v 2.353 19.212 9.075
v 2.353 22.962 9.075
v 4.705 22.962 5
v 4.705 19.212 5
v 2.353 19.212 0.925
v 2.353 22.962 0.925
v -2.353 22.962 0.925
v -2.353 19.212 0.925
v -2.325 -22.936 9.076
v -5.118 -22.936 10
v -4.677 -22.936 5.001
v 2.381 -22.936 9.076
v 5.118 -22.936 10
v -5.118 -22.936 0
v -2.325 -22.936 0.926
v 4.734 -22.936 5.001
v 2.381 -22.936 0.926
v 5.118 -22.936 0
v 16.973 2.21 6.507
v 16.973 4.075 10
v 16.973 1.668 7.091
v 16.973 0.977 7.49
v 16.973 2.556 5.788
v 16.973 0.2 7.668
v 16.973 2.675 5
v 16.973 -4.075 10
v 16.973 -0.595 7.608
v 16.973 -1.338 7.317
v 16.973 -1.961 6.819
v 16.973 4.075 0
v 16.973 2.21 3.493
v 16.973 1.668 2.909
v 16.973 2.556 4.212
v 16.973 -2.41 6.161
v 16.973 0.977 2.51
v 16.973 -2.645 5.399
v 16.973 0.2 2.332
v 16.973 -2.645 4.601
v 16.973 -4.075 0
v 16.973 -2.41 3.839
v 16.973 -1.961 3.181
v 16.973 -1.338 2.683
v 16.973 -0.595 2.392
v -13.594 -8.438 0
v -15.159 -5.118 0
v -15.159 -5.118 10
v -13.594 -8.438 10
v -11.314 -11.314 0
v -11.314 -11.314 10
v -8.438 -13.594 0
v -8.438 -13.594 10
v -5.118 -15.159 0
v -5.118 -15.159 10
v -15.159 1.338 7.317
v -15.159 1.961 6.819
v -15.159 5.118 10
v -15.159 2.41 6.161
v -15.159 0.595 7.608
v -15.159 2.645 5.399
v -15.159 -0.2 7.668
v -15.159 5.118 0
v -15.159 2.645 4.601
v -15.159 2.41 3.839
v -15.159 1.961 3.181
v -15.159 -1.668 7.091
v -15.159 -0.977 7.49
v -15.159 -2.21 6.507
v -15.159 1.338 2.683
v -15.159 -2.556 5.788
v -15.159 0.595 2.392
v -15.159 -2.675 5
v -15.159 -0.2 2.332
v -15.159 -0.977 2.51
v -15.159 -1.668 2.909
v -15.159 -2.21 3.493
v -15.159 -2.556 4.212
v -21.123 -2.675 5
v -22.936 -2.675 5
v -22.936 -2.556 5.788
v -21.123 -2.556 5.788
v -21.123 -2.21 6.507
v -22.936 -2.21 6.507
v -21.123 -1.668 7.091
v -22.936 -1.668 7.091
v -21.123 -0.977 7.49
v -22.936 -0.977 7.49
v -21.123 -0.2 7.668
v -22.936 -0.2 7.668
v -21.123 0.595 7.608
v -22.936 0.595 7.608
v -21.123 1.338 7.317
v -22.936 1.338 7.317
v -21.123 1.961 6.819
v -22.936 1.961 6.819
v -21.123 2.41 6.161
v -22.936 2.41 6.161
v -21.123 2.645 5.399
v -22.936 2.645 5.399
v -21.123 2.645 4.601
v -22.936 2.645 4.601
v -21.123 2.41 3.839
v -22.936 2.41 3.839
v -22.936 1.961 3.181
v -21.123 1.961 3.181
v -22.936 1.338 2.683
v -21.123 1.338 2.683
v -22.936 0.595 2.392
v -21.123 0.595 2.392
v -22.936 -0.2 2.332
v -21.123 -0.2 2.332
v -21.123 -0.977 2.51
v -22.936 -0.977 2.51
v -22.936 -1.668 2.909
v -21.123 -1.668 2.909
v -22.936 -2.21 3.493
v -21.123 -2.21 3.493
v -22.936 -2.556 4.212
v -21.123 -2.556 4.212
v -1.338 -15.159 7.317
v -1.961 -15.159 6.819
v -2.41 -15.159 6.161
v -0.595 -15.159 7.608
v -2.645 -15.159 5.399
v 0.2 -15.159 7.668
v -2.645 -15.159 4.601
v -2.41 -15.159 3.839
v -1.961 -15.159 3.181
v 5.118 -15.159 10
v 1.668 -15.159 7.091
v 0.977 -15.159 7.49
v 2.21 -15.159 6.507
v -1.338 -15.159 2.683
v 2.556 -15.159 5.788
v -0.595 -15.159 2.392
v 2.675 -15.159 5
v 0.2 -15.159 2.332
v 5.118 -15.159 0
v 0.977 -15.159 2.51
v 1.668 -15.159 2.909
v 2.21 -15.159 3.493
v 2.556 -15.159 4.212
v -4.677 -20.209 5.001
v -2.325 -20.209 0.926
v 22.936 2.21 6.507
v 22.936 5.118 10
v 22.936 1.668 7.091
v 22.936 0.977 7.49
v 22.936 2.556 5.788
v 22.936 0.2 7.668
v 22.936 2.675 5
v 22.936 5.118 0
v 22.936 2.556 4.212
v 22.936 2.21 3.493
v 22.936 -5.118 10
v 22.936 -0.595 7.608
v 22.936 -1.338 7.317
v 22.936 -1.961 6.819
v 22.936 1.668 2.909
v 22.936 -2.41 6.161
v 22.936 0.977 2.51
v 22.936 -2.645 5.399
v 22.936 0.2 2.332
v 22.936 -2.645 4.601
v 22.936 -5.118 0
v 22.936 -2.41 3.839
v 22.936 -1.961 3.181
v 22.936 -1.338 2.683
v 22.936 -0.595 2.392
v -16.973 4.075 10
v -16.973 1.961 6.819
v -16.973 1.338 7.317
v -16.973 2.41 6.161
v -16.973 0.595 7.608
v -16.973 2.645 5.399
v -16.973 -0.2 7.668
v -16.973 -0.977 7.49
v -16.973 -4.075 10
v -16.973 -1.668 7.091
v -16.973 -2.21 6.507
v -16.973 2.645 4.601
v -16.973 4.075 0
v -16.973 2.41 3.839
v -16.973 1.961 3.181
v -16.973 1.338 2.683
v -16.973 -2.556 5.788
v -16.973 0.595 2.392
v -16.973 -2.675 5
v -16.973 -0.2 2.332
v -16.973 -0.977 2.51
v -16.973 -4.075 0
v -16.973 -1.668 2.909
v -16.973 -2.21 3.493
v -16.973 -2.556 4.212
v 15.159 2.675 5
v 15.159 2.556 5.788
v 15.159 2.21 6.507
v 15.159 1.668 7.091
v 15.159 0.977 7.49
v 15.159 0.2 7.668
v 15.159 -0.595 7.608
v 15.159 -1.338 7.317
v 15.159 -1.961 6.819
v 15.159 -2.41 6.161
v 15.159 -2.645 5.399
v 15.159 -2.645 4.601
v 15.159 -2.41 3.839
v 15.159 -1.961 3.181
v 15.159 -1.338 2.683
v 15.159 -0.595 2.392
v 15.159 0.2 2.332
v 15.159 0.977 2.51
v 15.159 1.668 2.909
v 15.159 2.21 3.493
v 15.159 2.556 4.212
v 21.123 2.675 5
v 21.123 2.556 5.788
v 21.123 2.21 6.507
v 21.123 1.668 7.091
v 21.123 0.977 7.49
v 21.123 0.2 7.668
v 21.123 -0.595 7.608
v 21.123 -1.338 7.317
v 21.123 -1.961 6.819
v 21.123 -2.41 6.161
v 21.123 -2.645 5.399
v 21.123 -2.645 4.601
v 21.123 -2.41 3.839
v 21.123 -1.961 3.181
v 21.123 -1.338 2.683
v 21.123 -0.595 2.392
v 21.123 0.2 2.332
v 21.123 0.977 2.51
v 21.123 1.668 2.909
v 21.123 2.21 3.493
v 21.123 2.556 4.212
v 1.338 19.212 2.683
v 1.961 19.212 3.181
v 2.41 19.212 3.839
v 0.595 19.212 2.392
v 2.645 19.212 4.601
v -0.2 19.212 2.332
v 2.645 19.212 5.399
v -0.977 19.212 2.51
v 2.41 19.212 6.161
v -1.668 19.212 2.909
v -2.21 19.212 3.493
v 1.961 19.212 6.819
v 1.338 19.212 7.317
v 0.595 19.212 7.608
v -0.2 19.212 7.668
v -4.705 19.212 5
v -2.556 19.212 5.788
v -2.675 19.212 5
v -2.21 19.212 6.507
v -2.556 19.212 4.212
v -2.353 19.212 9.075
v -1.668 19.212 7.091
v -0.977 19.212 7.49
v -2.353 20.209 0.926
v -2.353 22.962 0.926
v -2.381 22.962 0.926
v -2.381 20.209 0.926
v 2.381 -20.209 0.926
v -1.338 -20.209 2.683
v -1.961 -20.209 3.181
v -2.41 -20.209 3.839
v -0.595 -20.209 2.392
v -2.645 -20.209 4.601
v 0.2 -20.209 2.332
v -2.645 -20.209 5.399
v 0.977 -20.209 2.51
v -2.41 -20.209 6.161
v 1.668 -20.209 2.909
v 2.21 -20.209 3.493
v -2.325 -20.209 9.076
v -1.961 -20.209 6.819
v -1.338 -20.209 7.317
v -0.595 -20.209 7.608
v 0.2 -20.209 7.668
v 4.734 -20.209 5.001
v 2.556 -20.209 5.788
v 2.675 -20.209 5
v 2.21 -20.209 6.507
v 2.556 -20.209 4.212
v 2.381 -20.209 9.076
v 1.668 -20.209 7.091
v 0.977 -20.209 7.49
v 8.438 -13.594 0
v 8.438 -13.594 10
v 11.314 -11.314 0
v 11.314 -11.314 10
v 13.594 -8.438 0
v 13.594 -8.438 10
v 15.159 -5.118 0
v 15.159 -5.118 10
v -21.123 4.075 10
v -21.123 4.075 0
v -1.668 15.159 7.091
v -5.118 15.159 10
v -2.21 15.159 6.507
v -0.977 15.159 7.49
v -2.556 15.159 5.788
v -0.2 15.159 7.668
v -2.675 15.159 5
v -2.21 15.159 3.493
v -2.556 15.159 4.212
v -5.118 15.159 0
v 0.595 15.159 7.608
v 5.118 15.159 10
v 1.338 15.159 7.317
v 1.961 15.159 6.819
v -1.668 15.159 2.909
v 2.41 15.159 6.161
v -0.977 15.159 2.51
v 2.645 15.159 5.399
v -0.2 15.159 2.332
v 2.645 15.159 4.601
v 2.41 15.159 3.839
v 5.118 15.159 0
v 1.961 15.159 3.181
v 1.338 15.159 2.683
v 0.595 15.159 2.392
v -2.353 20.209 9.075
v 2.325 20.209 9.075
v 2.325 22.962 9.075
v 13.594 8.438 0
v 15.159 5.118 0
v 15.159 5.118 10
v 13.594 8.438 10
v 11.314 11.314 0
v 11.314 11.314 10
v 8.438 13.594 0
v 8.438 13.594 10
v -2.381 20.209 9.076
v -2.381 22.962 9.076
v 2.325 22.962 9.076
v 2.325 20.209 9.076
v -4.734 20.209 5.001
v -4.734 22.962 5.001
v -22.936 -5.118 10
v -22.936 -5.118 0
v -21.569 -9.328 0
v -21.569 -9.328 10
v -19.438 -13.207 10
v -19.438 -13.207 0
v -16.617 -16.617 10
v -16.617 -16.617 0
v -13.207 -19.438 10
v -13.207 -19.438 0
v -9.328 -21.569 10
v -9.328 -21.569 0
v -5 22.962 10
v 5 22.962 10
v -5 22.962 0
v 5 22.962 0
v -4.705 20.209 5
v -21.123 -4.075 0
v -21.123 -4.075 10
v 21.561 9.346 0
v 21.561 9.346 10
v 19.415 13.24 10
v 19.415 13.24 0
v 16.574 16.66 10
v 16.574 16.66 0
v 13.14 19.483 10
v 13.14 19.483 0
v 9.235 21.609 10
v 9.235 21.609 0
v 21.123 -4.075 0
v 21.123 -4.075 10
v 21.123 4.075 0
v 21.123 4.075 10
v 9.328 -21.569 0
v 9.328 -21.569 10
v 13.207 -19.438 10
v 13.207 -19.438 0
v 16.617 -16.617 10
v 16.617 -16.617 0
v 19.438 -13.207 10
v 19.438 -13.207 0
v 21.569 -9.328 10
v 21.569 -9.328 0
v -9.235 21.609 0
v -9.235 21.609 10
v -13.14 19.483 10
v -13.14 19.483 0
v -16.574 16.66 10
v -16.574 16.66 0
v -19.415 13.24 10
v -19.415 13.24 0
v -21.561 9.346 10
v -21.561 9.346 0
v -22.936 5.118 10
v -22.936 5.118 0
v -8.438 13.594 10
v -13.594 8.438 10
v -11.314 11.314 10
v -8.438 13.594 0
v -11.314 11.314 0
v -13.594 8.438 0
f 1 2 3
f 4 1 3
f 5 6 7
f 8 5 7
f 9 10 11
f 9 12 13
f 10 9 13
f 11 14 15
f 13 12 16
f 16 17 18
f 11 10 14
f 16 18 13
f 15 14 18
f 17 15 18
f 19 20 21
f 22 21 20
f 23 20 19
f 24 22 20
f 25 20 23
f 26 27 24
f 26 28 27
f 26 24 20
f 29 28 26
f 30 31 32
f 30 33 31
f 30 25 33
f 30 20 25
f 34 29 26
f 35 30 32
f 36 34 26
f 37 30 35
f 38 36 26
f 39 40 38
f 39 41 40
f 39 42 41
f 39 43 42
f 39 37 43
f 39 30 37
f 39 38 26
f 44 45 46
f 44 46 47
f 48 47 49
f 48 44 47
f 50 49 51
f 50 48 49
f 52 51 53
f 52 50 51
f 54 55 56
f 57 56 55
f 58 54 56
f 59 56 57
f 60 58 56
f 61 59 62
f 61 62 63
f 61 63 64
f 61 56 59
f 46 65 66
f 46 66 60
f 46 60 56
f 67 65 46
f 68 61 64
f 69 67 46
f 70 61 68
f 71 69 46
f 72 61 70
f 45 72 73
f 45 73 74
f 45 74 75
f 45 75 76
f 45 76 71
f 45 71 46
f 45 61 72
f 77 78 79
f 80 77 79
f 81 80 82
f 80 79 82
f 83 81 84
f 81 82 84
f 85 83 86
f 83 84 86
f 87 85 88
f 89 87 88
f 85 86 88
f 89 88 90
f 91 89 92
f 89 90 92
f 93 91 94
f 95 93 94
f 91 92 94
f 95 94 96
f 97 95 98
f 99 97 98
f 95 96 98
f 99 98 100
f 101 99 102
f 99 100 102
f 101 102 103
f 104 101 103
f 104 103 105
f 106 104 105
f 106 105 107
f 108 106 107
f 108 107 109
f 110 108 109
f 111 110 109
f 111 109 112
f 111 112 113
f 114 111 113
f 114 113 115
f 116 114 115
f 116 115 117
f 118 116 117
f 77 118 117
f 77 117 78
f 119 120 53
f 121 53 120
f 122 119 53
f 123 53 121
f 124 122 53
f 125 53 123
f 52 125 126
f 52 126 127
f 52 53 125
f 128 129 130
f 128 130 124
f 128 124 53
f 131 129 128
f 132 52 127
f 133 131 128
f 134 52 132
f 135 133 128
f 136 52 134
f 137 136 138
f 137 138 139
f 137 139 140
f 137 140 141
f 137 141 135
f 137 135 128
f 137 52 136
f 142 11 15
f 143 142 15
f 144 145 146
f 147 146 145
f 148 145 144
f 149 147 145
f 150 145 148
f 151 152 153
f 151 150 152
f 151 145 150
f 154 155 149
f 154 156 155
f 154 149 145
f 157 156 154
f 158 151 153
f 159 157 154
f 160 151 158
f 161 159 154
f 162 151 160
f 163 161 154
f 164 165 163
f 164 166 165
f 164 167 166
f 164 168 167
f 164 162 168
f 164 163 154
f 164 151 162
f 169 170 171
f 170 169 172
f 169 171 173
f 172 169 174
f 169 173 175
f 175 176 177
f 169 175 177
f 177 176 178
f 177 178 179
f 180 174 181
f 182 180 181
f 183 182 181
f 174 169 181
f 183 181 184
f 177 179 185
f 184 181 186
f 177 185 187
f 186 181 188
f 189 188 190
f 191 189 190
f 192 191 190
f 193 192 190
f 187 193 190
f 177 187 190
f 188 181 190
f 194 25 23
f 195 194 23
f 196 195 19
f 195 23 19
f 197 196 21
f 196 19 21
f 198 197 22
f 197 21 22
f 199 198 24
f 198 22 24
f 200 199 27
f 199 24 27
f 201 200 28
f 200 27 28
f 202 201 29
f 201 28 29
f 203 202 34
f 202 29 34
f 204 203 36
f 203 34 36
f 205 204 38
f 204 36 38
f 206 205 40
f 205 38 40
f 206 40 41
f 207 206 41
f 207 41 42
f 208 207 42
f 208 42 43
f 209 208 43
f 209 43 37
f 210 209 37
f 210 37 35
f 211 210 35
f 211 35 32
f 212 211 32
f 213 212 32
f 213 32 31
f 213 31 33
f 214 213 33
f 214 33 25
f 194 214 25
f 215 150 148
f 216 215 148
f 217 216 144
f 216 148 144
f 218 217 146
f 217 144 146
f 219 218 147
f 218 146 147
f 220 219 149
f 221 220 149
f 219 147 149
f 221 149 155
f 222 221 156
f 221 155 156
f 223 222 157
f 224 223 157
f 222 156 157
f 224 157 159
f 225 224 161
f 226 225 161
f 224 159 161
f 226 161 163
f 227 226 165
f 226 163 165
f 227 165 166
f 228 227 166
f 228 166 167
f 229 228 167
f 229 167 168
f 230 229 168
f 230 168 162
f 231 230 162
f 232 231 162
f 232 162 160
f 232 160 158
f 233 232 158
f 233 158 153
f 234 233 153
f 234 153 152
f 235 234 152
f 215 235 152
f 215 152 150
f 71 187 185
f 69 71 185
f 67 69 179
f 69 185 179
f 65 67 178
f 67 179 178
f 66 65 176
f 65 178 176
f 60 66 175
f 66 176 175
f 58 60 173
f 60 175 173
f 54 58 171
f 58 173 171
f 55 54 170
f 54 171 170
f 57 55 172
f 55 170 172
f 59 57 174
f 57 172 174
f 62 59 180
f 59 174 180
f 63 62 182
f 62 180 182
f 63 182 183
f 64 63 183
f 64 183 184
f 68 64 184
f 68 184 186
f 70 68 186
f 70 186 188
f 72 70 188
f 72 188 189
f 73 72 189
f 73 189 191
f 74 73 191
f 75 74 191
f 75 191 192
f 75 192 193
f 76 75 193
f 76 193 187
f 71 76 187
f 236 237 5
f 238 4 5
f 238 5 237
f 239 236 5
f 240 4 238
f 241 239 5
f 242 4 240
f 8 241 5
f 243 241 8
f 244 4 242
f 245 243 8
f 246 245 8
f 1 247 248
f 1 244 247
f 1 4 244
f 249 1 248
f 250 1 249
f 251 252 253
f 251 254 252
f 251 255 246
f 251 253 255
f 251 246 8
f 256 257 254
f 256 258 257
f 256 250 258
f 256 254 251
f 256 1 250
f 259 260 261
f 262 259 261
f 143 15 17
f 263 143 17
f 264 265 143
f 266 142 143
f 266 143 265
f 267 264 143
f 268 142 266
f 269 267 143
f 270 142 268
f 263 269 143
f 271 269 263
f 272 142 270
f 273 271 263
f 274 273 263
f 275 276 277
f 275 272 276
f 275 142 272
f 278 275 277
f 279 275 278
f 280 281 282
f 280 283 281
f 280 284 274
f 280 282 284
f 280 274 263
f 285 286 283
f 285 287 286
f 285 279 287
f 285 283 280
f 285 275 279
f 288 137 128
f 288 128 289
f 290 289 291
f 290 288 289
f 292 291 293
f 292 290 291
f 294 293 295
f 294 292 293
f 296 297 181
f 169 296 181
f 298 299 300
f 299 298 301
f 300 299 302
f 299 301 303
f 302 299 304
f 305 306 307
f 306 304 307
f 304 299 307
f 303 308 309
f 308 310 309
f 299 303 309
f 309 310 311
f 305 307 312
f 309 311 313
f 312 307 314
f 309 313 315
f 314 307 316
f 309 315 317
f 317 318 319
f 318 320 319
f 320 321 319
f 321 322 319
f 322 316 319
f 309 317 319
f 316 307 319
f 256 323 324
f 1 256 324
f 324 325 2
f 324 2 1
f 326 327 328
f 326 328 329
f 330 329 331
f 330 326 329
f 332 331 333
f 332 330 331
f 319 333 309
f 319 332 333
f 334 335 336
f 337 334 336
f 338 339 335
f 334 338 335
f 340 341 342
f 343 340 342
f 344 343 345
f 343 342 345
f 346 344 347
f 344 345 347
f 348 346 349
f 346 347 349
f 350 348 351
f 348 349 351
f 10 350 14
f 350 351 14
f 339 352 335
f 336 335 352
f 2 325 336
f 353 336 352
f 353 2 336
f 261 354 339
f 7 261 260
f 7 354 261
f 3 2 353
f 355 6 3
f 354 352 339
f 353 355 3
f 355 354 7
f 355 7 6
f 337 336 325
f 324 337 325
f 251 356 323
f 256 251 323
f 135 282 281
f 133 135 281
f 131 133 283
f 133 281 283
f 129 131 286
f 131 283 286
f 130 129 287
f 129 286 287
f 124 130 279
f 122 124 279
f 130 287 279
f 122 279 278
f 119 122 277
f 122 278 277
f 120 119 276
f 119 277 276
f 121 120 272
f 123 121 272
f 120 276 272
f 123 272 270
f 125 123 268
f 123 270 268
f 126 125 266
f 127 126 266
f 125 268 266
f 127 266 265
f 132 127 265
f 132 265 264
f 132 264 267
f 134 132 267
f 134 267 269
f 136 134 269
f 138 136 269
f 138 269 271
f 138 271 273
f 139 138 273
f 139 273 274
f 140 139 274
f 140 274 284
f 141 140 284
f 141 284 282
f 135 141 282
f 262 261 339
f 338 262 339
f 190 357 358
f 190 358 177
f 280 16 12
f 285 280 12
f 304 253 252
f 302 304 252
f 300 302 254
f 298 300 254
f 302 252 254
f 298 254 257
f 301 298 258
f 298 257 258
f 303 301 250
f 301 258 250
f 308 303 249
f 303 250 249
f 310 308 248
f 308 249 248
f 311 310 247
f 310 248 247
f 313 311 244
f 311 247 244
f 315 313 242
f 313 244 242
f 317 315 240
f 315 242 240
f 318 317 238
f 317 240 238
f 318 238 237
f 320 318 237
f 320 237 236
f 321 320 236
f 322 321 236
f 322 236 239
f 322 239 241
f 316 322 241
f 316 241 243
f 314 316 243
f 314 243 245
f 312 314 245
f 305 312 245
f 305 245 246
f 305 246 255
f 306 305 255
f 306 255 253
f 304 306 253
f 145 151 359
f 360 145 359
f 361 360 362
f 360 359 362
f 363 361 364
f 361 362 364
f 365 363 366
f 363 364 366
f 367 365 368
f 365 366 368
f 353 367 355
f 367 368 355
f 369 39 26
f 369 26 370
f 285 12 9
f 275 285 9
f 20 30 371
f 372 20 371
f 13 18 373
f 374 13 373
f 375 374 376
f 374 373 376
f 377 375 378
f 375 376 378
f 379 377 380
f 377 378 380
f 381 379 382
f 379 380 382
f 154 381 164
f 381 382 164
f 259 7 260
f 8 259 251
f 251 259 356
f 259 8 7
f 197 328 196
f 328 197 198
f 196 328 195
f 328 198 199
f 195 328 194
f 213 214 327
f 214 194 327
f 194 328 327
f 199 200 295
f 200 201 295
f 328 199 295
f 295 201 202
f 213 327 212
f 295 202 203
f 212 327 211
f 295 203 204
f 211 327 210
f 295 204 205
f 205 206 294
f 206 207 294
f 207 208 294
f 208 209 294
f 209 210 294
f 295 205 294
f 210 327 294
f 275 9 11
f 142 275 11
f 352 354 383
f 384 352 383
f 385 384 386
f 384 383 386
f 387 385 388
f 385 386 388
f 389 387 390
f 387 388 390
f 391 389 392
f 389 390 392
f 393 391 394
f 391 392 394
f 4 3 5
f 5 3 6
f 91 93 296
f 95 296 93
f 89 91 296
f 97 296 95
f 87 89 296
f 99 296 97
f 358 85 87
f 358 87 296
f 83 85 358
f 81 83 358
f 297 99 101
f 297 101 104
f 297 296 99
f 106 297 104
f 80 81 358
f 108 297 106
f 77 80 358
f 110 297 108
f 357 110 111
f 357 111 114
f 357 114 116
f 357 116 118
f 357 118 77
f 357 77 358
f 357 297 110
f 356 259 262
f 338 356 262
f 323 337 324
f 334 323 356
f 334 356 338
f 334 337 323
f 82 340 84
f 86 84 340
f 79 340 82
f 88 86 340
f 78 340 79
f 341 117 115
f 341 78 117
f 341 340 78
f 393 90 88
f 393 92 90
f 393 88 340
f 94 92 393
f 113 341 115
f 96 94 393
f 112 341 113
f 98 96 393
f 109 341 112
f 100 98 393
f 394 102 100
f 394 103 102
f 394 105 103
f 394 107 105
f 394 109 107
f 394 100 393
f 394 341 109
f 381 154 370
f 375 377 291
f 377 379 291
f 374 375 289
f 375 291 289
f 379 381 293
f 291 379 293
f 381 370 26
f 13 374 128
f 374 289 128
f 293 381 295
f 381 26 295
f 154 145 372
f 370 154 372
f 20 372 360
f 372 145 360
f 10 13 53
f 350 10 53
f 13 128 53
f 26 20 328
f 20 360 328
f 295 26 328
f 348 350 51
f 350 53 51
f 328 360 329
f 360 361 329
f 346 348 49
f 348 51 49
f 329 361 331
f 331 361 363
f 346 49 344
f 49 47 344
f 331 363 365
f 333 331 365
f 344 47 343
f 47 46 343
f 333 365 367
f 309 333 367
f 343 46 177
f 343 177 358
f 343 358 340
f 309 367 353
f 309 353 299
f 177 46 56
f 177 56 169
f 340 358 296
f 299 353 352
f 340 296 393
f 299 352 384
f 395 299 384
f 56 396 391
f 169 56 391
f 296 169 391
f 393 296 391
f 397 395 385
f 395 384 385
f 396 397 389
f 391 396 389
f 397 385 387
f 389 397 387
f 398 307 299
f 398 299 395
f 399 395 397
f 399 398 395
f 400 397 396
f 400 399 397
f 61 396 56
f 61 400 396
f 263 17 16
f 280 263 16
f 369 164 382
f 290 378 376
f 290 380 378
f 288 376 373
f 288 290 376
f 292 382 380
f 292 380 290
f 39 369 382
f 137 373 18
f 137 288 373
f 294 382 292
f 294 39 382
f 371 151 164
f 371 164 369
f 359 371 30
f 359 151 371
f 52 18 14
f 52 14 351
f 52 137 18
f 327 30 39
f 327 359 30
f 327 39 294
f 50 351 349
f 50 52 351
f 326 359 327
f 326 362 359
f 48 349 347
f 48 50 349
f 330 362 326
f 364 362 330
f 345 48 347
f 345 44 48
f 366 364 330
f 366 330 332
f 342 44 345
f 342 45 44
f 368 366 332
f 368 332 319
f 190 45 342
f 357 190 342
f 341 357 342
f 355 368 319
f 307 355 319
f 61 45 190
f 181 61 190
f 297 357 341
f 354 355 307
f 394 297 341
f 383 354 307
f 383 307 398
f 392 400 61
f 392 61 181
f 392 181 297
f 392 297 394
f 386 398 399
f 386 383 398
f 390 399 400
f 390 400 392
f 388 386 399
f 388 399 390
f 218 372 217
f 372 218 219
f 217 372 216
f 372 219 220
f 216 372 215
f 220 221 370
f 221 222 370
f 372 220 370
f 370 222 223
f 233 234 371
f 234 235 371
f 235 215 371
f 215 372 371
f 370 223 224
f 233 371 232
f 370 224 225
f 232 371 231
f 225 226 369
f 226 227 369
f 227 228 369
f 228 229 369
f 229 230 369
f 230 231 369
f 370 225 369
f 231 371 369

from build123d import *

# Parameters (mm, degrees)
PAD_DEPTH             = 10
SKETCH001_R           = 2.675
POCKET_DEPTH          = 7.776573
POCKET001_DEPTH       = 3.75
SKETCH003_W           = 4.15
SKETCH003_H           = 8.15
POCKET002_DEPTH       = 10
POLARPATTERN_COUNT    = 2
POLARPATTERN003_COUNT = 4
POCKET011_DEPTH       = 3.75


with BuildPart() as part:
    # Sketch → Pad (new body)
    with BuildSketch(Plane.XY):
        with BuildLine():
            Line((-22.935879, -5.118149), (-22.935879, 5.118149))
            ThreePointArc((-5, 22.961925), (-16.57418, 16.659729), (-22.935879, 5.118149))
            Line((-5, 22.961925), (5, 22.961925))
            ThreePointArc((22.935879, 5.118149), (16.57418, 16.659729), (5, 22.961925))
            Line((22.935879, 5.118149), (22.935879, -5.118149))
            ThreePointArc((5.118149, -22.935879), (16.617009, -16.617009), (22.935879, -5.118149))
            Line((-5.118149, -22.935879), (5.118149, -22.935879))
            ThreePointArc((-22.935879, -5.118149), (-16.617009, -16.617009), (-5.118149, -22.935879))
        make_face()
        with BuildLine():
            Line((-15.159306, 5.118149), (-15.159306, -5.118149))
            ThreePointArc((-15.159306, -5.118149), (-11.313708, -11.313708), (-5.118149, -15.159306))
            Line((-5.118149, -15.159306), (5.118149, -15.159306))
            ThreePointArc((5.118149, -15.159306), (11.313708, -11.313708), (15.159306, -5.118149))
            Line((15.159306, 5.118149), (15.159306, -5.118149))
            ThreePointArc((15.159306, 5.118149), (11.313708, 11.313708), (5.118149, 15.159306))
            Line((-5.118149, 15.159306), (5.118149, 15.159306))
            ThreePointArc((-5.118149, 15.159306), (-11.313708, 11.313708), (-15.159306, 5.118149))
        make_face(mode=Mode.SUBTRACT)
    extrude(amount=PAD_DEPTH)

    # Sketch001 (on Face7 of Pad) → Pocket (cut)
    with BuildSketch(Plane.XZ.offset(22.935879)):
        with Locations((0, 5)):
            Circle(SKETCH001_R)
    pocket = extrude(amount=-POCKET_DEPTH, mode=Mode.SUBTRACT)

    # Sketch002 → Pocket001 (cut)
    with BuildSketch(Plane.XZ.offset(23.958595)):
        Polygon((2.380832, 9.076277), (-2.324572, 9.076277), (-4.677275, 5.001277), (-2.324572, 0.926277), (2.380832, 0.926277), (4.733535, 5.001277), align=None)
    pocket001 = extrude(amount=-POCKET001_DEPTH, mode=Mode.SUBTRACT)

    # Sketch003 → Pocket002 (cut)
    with BuildSketch(Plane(origin=(0, 0, 0), x_dir=(1, 0, 0), z_dir=(0, 0, -1))):
        with Locations((-19.047593, 0)):
            Rectangle(SKETCH003_W, SKETCH003_H)
        with Locations((19.047593, 0)):
            Rectangle(SKETCH003_W, SKETCH003_H)
    extrude(amount=-POCKET002_DEPTH, mode=Mode.SUBTRACT)

    # PolarPattern: Pocket001 ×2 about axis
    polarpattern_axis = Axis((0, 0, 0), (0, 0, 1))
    for i in range(1, POLARPATTERN_COUNT):
        add(pocket001.rotate(polarpattern_axis, i * 360 / POLARPATTERN_COUNT), mode=Mode.SUBTRACT)

    # PolarPattern003: Pocket ×4 about axis
    polarpattern003_axis = Axis((0, 0, 0), (0, 0, 1))
    for i in range(1, POLARPATTERN003_COUNT):
        add(pocket.rotate(polarpattern003_axis, i * 360 / POLARPATTERN003_COUNT), mode=Mode.SUBTRACT)

    # Sketch014 (on Face8 of PolarPattern003) → Pocket011 (cut)
    with BuildSketch(Plane(origin=(0, 22.961925, 0), x_dir=(-1, 0, 0), z_dir=(0, 1, 0))):
        Polygon((4.705405, 5), (2.352702, 9.075), (-2.352702, 9.075), (-4.705405, 5), (-2.352702, 0.925), (2.352702, 0.925), align=None)
    extrude(amount=-POCKET011_DEPTH, mode=Mode.SUBTRACT)


solid = part.part
